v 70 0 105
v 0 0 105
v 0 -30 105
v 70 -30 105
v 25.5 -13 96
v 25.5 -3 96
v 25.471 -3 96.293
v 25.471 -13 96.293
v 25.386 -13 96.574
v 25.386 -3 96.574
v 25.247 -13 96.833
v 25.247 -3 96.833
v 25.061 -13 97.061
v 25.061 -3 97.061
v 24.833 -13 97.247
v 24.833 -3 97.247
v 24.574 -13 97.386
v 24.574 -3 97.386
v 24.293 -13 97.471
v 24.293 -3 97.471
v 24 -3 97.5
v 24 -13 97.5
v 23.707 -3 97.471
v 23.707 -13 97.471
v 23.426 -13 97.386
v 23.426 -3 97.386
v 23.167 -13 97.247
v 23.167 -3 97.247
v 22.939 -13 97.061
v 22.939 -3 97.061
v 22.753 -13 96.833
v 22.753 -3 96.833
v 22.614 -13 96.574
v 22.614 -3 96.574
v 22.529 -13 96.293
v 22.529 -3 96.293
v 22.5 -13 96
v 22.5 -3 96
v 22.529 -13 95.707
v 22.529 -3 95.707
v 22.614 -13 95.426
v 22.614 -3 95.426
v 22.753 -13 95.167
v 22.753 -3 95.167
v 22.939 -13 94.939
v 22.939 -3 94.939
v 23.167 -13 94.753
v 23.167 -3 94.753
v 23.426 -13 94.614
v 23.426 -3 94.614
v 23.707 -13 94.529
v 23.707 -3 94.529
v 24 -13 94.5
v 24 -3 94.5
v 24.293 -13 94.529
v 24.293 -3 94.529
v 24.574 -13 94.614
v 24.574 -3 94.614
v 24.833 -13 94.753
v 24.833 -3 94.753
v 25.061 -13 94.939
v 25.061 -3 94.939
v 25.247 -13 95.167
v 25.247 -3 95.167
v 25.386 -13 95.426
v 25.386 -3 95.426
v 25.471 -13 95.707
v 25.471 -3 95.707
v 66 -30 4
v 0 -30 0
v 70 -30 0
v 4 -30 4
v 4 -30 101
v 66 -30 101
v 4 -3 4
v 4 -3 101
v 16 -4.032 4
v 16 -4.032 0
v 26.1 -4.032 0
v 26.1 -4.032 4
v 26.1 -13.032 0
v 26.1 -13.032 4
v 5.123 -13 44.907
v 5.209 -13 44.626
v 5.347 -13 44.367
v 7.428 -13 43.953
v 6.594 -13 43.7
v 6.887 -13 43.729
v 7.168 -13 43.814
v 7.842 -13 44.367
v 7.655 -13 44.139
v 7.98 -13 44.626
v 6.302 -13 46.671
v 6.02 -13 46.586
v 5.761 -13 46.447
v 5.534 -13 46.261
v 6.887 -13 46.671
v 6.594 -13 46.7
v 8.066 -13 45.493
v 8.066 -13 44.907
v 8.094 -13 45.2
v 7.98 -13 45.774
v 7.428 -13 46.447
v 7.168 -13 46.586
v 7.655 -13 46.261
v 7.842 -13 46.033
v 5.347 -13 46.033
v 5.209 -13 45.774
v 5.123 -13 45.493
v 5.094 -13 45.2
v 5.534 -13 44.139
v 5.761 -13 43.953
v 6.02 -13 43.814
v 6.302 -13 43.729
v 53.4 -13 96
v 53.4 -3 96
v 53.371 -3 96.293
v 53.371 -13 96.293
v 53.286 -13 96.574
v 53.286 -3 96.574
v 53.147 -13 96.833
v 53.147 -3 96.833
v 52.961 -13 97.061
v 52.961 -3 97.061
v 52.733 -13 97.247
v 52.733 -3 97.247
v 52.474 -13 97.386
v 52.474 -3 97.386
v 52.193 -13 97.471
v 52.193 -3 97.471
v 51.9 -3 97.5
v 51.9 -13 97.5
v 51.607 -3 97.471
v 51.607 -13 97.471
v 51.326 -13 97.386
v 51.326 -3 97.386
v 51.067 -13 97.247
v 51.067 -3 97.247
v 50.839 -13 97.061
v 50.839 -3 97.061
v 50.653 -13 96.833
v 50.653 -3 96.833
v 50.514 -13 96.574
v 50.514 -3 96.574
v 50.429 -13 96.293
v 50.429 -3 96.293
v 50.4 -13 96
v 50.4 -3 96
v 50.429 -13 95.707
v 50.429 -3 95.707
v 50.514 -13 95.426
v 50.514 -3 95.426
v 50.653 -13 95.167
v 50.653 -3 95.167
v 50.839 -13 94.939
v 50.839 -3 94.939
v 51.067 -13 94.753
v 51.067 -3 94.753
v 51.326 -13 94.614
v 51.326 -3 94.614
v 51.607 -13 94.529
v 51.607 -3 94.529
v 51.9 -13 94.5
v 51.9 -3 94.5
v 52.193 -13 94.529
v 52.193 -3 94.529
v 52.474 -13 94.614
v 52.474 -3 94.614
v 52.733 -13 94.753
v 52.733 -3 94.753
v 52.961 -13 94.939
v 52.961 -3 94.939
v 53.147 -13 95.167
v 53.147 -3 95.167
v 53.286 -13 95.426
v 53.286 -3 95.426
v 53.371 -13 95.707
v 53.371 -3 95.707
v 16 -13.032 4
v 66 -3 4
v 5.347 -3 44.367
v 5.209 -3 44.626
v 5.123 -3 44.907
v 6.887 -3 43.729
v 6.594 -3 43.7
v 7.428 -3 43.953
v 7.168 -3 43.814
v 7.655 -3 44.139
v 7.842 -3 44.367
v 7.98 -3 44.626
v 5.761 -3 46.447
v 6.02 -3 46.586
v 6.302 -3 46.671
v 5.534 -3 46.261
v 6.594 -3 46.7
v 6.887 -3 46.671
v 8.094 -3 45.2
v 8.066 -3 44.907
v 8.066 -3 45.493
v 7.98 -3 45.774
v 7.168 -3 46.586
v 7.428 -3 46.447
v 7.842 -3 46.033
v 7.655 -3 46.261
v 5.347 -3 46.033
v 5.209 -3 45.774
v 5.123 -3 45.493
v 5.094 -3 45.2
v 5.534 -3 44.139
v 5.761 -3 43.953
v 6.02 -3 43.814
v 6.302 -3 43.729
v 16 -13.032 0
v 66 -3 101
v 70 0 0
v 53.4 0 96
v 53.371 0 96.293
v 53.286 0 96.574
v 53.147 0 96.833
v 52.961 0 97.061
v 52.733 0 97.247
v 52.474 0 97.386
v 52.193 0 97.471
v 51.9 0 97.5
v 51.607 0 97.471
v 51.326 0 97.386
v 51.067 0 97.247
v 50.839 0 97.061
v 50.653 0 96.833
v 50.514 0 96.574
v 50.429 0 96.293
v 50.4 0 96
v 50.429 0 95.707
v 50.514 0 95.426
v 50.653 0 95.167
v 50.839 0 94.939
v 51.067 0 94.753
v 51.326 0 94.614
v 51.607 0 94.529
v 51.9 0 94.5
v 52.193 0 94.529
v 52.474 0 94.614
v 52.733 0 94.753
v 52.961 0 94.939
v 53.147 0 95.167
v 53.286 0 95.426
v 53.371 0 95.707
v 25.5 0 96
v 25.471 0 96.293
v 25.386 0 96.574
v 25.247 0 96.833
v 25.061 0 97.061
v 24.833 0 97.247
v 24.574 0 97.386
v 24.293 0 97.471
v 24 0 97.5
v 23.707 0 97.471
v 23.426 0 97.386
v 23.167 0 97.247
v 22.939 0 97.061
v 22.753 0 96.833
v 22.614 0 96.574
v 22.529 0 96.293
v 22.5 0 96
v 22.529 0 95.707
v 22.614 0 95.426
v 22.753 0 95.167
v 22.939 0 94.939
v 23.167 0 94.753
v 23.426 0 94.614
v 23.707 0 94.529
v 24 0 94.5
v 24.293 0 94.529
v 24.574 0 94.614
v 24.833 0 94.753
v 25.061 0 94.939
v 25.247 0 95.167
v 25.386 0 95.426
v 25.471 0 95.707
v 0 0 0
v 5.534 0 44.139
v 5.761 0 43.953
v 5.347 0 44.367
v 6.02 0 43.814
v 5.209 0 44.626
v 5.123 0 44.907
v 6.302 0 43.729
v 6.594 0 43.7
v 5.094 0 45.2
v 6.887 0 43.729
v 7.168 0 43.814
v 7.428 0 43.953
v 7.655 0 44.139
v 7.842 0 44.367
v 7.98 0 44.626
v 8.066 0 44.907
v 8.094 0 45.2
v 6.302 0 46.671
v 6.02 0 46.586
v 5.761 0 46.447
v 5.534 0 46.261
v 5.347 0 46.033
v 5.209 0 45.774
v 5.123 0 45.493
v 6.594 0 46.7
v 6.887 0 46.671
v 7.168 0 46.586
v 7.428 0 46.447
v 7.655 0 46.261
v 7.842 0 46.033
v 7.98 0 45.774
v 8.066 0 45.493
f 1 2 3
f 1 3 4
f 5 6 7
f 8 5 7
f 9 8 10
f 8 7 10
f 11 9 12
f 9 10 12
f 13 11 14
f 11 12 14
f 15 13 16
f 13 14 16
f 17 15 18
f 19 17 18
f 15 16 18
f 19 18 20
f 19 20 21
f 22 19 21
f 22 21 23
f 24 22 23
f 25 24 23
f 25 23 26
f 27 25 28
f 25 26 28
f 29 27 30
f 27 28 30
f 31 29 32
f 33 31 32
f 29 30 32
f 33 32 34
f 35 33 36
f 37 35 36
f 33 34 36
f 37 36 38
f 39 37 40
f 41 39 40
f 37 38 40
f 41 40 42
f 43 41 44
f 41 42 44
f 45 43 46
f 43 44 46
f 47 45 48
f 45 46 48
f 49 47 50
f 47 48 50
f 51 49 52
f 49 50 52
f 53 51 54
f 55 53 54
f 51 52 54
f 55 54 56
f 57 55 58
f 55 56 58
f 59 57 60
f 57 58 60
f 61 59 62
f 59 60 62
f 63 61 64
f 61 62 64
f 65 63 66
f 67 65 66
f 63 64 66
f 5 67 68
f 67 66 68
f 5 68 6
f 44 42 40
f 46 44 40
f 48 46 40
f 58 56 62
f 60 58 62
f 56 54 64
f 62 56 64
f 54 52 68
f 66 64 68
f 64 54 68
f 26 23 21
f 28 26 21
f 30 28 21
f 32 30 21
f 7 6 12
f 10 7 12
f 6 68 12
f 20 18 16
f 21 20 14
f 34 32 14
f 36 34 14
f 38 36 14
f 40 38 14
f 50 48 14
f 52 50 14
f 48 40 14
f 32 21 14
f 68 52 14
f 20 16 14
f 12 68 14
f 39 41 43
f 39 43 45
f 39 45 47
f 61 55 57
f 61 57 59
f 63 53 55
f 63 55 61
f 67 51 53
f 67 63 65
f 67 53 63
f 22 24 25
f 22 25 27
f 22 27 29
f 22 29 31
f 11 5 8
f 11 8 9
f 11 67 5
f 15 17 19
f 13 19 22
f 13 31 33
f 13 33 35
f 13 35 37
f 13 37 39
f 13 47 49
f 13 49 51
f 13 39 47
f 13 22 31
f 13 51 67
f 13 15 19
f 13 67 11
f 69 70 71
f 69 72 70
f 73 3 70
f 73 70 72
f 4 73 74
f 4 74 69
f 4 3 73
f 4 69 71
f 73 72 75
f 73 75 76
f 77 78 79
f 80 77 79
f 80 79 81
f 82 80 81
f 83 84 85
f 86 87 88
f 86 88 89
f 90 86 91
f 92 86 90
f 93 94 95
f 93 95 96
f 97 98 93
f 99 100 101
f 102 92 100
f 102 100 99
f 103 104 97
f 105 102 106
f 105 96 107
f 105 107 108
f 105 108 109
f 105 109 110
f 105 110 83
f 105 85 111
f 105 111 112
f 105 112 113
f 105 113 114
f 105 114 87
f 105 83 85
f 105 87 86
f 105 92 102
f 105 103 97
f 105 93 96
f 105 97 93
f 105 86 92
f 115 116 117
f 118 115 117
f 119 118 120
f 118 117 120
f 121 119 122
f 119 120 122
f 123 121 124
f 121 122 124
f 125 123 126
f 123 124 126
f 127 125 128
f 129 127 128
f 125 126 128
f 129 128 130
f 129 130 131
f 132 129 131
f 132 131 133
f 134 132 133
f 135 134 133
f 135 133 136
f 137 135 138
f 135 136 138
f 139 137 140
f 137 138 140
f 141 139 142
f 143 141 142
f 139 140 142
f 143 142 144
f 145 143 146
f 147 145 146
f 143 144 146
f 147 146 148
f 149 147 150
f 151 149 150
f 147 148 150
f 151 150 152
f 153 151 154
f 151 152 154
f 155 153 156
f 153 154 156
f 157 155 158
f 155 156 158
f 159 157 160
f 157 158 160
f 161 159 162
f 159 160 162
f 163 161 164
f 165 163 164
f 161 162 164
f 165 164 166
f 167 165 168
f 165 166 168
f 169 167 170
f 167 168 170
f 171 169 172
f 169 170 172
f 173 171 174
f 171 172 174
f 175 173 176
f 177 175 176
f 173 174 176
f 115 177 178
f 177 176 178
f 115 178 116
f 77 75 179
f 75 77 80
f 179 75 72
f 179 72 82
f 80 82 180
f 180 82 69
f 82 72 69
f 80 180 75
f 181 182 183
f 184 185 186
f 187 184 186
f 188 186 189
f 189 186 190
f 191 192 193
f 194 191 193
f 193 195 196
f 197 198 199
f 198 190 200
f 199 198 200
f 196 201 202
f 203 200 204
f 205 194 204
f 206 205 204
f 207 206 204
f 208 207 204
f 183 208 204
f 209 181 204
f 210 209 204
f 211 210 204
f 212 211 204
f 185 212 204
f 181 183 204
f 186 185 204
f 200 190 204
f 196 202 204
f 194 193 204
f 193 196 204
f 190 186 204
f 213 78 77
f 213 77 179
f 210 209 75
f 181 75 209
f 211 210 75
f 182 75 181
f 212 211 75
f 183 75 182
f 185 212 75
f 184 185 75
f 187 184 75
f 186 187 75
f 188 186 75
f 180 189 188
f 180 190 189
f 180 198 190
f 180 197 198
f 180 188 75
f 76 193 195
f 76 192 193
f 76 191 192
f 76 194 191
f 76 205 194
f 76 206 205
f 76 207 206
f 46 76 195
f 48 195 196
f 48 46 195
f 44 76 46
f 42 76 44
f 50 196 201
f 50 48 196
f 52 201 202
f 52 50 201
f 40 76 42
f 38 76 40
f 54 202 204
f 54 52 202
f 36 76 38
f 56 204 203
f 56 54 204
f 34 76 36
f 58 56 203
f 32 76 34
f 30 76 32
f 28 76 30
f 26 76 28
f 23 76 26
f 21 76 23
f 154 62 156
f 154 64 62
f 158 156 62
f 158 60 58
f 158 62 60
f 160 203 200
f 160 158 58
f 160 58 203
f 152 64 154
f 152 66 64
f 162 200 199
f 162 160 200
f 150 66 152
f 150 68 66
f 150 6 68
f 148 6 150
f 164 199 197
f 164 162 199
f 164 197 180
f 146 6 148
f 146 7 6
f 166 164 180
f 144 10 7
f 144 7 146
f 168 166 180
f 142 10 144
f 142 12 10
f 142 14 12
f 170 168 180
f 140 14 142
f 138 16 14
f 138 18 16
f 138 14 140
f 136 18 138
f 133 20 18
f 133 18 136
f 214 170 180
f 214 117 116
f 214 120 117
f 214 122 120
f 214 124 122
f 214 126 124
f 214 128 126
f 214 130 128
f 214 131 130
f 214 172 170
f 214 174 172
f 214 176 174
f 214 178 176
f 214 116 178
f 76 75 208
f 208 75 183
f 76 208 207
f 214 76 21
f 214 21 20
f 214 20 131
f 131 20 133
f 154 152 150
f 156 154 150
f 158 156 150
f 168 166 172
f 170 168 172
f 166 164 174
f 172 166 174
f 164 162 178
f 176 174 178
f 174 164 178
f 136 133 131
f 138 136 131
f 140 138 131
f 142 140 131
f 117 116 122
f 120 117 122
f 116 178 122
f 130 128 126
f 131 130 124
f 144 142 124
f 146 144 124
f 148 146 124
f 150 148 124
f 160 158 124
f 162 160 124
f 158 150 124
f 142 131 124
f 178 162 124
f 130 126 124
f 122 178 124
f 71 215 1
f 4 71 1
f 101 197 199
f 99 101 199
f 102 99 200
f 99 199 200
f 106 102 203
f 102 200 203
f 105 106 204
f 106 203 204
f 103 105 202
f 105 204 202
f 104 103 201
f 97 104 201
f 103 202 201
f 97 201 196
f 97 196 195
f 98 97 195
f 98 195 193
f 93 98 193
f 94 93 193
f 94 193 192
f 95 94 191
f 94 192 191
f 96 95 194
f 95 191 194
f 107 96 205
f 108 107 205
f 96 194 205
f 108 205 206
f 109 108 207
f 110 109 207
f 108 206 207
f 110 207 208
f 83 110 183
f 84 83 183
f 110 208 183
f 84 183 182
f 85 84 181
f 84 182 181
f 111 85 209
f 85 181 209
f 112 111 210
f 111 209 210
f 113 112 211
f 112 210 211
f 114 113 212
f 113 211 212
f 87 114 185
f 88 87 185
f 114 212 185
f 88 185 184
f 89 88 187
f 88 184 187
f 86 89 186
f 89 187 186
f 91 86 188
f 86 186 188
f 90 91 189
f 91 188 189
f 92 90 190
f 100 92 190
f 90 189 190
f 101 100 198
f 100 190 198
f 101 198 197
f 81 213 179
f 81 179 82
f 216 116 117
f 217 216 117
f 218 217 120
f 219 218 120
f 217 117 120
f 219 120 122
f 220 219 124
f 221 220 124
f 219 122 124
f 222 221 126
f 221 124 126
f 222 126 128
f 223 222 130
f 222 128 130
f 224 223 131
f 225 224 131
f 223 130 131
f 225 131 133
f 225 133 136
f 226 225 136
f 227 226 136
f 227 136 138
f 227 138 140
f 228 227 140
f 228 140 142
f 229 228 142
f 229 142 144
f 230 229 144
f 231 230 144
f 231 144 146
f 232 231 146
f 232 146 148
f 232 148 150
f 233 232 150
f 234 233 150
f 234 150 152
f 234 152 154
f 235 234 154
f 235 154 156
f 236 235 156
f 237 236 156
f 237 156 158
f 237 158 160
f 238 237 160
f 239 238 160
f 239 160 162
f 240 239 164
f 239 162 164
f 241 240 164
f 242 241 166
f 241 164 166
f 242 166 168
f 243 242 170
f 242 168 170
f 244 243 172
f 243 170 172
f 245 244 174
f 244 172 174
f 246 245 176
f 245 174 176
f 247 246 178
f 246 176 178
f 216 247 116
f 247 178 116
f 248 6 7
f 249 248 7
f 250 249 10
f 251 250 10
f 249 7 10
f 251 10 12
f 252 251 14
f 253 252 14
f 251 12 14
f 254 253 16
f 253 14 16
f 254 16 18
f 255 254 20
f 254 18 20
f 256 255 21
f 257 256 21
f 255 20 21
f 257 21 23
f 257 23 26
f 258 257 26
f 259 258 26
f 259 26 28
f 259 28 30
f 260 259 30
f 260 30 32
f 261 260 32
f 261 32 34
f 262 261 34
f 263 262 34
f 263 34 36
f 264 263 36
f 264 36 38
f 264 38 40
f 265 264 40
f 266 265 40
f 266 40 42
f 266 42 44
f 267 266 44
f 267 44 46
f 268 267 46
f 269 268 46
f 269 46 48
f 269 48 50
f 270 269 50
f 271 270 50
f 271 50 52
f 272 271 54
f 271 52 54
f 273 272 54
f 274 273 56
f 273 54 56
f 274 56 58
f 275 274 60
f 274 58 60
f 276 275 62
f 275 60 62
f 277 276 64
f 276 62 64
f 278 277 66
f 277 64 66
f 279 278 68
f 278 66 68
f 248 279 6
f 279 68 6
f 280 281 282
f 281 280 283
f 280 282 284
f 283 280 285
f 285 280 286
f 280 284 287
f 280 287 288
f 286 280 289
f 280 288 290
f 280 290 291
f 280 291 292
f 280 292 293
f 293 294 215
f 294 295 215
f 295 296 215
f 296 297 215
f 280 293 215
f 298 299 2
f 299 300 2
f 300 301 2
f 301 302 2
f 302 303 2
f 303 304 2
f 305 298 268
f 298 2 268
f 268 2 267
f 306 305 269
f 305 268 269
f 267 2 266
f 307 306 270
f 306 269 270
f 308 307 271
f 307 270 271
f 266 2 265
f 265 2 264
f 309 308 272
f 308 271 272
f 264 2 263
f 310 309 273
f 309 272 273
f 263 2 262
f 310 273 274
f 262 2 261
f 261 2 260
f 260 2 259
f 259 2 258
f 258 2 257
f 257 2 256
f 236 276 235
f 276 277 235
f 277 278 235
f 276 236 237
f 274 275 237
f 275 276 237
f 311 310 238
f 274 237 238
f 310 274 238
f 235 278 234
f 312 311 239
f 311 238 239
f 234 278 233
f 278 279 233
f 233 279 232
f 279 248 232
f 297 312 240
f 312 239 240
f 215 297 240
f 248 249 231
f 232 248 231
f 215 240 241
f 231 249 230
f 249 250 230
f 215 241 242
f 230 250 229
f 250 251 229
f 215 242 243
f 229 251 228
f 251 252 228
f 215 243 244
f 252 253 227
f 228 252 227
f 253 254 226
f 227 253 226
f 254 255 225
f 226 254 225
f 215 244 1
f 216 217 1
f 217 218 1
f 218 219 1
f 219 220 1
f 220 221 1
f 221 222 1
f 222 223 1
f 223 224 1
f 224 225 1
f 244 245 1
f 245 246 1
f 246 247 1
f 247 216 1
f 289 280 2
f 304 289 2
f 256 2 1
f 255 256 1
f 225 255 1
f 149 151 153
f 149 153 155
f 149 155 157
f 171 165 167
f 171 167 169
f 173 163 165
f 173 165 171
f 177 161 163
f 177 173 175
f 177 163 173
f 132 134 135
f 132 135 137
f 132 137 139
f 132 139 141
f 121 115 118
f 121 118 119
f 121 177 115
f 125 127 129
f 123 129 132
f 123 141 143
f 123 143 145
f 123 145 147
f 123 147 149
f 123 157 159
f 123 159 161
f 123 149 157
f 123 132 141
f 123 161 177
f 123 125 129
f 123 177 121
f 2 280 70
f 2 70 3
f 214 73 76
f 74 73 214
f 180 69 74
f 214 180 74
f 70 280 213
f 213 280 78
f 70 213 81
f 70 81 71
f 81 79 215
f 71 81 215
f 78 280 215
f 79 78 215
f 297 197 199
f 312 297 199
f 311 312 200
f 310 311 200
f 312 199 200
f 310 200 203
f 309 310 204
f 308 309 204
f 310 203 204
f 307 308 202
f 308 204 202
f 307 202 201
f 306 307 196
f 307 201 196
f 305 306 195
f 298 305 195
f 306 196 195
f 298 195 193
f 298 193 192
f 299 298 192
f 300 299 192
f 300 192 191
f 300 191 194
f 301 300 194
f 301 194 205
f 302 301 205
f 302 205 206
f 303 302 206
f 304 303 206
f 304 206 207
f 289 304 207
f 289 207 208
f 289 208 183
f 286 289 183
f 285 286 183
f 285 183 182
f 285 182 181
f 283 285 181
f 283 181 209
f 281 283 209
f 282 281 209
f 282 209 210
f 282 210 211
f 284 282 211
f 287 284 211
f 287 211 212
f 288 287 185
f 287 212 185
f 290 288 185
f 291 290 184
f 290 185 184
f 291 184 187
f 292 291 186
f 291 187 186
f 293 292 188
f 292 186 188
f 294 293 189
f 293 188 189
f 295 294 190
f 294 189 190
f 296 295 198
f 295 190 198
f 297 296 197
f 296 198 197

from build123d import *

# Parameters (mm, degrees)
F0_W     = 70
F0_H     = 105
F1_DEPTH = 30
F2_W     = 62
F2_H     = 97
F3_DEPTH = 27
F4_R     = 1.5
F5_DEPTH = 25
F6_DEPTH = 10
F7_W     = 10.1
F7_H     = 9
F8_DEPTH = 25
F9_DEPTH = 25


with BuildPart() as f1:
    # F0 (on Front) → F1 (new body)
    with BuildSketch(Plane.XZ):
        with Locations((35, 52.5)):
            Rectangle(F0_W, F0_H)
    extrude(amount=F1_DEPTH)

    # F2 (on face) → F3 (cut)
    with BuildSketch(Plane.XZ.offset(30)):
        with Locations((35, 52.5)):
            Rectangle(F2_W, F2_H)
    extrude(amount=-F3_DEPTH, mode=Mode.SUBTRACT)

    # F4 (on face) → F5 (cut)
    with BuildSketch(Plane.XZ.offset(3)):
        with Locations((24, 96)):
            Circle(F4_R)
        with Locations((51.9, 96)):
            Circle(F4_R)
        with Locations((6.5944148228, 45.2)):
            Circle(F4_R)
    extrude(amount=-F5_DEPTH, mode=Mode.SUBTRACT)

    # F7 (on face) → F8 (cut)
    with BuildSketch(Plane(origin=(0, 0, 0), x_dir=(1, 0, 0), z_dir=(0, 0, -1))):
        with Locations((21.05, 8.5319359787)):
            Rectangle(F7_W, F7_H)
    extrude(amount=-F8_DEPTH, mode=Mode.SUBTRACT)

    # F7 (on face) → F9 (cut)
    with BuildSketch(Plane(origin=(0, 0, 0), x_dir=(1, 0, 0), z_dir=(0, 0, -1))):
        with Locations((21.05, 8.5319359787)):
            Rectangle(F7_W, F7_H)
    extrude(amount=-F9_DEPTH, mode=Mode.SUBTRACT)


with BuildPart() as f6:
    # F4 (on face) → F6 (new body)
    with BuildSketch(Plane.XZ.offset(3)):
        with Locations((24, 96)):
            Circle(F4_R)
    extrude(amount=F6_DEPTH)


with BuildPart() as f6b:
    # F4 (on face) → F6, piece 2 (new body)
    with BuildSketch(Plane.XZ.offset(3)):
        with Locations((51.9, 96)):
            Circle(F4_R)
    extrude(amount=F6_DEPTH)


with BuildPart() as f6c:
    # F4 (on face) → F6, piece 3 (new body)
    with BuildSketch(Plane.XZ.offset(3)):
        with Locations((6.5944148228, 45.2)):
            Circle(F4_R)
    extrude(amount=F6_DEPTH)


solid = Compound([f1.part, f6.part, f6b.part, f6c.part])
